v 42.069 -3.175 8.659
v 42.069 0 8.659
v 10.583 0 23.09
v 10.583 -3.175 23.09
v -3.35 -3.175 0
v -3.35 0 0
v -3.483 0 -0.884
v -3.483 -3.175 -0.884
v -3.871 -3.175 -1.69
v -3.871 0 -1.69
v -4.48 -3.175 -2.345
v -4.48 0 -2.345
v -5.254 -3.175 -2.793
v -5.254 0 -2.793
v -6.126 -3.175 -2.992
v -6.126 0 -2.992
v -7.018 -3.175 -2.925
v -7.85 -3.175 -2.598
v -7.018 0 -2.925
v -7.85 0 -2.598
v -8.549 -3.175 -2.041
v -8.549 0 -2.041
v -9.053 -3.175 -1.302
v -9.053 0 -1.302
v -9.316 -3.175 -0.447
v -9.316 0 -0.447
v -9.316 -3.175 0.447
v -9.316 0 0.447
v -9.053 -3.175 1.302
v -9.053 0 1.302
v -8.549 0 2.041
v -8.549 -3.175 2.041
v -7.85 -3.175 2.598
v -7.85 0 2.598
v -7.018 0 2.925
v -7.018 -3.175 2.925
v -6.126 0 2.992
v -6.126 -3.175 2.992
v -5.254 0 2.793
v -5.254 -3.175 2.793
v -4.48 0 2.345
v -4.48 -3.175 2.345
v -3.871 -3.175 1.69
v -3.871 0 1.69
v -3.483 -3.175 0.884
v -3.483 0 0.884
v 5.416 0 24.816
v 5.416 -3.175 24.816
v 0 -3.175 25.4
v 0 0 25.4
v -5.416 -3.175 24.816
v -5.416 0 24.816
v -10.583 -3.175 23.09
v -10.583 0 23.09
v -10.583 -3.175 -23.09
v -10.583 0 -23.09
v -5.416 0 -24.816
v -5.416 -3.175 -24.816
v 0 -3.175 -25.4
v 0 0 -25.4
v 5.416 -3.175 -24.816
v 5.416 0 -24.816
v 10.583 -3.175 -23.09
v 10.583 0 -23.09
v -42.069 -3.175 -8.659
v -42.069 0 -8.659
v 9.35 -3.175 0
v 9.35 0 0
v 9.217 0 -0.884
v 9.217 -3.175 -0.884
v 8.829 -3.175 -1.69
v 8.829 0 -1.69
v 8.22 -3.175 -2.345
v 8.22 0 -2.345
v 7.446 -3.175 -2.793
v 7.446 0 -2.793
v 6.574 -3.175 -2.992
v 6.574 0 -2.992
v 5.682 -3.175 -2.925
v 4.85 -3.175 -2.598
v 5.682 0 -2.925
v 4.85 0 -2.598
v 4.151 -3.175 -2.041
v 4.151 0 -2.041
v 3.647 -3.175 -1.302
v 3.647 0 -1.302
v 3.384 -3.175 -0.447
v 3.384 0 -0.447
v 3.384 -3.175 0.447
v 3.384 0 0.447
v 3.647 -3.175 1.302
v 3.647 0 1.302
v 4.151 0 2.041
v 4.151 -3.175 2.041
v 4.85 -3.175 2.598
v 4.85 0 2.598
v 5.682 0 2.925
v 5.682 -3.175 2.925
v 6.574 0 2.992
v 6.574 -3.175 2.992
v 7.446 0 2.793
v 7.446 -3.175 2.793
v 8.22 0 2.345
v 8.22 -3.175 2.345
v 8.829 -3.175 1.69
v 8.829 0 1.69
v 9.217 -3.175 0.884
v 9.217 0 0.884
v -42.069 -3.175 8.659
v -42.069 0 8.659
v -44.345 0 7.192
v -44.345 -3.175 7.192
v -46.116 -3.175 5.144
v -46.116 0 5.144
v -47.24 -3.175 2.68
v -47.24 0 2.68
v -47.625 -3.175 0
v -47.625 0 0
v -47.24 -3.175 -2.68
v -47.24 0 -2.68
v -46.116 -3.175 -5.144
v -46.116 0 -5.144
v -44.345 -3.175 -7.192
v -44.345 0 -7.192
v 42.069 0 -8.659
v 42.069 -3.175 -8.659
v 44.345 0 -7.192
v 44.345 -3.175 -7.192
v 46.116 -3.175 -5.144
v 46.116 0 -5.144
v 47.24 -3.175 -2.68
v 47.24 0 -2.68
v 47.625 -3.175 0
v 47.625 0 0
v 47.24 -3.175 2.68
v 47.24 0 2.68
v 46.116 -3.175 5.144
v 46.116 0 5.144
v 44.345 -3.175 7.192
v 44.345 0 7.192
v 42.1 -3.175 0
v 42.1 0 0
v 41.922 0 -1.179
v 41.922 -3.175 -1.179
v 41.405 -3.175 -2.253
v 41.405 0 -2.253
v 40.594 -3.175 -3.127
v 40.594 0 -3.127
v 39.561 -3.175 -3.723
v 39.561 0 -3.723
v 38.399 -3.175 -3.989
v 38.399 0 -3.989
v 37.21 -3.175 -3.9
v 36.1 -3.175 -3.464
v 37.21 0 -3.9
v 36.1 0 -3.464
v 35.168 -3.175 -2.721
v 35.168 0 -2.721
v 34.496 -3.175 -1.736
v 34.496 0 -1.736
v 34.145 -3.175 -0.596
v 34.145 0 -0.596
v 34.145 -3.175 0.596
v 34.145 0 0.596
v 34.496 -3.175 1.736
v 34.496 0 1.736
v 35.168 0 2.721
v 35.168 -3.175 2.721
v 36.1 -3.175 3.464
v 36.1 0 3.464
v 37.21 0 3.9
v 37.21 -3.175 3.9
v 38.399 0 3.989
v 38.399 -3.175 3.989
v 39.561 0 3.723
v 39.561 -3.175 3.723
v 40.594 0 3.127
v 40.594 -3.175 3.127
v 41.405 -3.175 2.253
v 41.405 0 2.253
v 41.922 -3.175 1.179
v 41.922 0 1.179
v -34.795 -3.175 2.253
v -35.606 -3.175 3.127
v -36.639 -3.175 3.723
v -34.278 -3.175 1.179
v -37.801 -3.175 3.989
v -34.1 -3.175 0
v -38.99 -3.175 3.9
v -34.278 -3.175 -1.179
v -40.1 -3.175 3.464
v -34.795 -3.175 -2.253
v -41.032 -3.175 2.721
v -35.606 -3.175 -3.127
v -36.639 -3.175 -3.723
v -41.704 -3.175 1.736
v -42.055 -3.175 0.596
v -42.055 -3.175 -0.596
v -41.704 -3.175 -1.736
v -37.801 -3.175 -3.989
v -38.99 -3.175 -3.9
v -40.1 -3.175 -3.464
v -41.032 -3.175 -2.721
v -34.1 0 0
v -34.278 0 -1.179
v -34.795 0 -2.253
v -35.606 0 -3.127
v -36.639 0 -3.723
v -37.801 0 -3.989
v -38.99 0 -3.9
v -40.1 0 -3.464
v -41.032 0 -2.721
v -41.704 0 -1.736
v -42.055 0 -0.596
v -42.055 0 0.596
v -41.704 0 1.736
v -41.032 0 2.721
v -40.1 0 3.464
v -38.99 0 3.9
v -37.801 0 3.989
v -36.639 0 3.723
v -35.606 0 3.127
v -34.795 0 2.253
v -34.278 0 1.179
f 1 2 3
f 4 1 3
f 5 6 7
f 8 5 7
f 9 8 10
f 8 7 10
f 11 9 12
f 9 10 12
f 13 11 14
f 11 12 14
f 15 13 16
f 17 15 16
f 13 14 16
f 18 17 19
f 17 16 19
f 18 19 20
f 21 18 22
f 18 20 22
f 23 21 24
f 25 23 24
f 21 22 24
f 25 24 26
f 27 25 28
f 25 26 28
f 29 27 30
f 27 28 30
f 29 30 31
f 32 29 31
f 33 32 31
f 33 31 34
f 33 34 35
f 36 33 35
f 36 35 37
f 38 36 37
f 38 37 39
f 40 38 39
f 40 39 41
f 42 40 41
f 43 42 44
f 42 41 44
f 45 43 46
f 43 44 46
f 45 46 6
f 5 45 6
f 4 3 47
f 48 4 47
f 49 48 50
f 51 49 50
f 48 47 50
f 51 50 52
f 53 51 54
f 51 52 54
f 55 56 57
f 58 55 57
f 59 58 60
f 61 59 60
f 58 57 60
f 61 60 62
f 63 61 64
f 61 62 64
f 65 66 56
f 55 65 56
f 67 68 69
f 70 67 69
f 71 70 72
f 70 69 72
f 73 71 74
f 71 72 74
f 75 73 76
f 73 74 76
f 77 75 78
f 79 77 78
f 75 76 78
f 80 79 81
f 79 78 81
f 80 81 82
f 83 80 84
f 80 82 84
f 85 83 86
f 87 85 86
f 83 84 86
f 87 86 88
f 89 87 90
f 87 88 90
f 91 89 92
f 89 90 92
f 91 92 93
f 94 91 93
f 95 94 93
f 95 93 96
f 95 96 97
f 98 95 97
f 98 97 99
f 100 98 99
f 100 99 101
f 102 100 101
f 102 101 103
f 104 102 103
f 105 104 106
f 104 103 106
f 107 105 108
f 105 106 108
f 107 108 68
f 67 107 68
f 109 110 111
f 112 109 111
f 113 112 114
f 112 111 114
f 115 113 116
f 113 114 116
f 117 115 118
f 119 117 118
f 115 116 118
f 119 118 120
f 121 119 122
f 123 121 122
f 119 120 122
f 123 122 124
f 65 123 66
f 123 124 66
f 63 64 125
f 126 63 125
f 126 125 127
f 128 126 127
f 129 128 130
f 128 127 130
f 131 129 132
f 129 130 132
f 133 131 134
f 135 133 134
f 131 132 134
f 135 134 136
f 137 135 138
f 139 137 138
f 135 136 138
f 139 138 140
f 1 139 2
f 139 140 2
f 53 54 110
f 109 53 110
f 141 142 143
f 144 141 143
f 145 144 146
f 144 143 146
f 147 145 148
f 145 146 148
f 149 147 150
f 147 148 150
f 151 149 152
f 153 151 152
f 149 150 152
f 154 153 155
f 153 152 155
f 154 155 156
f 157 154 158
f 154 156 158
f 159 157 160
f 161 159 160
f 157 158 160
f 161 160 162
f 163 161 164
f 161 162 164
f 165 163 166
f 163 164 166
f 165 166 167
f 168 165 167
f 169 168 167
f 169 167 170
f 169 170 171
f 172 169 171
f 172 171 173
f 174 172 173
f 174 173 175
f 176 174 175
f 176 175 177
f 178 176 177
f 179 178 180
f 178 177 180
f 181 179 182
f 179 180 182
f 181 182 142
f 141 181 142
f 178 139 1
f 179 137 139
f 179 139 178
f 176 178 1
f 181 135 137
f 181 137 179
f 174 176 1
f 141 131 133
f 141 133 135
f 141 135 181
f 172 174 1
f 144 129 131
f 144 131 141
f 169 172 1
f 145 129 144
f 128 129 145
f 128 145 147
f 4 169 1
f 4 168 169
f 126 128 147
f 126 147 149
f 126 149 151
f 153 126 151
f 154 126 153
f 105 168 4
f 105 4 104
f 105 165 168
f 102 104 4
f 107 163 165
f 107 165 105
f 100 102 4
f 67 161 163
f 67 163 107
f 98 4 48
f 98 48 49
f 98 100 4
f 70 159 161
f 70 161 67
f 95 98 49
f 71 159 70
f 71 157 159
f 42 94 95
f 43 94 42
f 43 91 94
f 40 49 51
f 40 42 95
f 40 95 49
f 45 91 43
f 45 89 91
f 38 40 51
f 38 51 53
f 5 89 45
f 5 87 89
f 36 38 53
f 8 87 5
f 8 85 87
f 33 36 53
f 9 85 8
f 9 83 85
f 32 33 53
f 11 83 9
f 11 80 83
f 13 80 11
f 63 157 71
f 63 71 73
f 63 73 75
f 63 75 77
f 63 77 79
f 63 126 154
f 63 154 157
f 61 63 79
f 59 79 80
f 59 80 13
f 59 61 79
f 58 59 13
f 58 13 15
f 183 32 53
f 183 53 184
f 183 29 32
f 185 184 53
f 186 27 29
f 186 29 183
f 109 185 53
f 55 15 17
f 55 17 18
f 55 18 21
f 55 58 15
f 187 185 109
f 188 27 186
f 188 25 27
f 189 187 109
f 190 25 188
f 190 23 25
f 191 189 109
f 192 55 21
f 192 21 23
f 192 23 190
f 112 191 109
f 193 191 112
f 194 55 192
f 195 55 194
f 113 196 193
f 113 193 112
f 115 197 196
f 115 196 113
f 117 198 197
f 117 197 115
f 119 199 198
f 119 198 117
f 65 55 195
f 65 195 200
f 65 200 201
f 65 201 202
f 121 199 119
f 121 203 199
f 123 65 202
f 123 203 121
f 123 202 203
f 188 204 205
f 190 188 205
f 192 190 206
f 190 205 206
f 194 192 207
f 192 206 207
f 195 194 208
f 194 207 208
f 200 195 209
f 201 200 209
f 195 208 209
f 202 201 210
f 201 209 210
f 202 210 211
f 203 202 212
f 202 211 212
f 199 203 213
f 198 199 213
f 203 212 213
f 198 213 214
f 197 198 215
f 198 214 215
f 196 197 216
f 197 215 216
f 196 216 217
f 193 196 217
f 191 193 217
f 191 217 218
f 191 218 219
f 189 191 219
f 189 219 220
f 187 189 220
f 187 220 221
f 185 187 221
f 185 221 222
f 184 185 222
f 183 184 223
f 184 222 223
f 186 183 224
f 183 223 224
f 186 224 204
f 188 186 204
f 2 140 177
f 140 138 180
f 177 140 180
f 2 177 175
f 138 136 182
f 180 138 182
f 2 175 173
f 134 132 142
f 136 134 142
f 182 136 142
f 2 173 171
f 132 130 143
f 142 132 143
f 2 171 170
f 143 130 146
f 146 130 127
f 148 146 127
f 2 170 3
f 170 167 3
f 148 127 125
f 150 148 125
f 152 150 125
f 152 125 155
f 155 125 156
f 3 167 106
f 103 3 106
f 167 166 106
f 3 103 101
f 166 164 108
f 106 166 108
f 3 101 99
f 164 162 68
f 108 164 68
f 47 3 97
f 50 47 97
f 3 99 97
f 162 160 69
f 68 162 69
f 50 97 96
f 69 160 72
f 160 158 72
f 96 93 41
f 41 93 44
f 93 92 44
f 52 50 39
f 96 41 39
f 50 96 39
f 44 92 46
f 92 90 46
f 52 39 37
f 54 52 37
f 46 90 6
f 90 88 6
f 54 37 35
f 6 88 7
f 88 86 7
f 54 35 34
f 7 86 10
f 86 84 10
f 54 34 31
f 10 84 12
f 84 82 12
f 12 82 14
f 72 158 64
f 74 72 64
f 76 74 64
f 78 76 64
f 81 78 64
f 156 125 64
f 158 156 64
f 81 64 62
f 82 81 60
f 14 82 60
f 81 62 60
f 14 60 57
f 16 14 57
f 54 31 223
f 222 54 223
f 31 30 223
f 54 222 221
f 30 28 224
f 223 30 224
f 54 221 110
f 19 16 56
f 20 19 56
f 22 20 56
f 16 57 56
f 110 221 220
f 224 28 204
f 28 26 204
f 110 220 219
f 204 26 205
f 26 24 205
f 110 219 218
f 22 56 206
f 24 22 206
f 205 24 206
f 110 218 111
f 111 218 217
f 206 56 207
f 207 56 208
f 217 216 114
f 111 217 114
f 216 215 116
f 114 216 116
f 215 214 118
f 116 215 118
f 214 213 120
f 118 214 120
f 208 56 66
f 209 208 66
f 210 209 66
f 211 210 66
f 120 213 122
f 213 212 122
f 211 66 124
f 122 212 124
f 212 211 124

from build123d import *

# Parameters (mm, degrees)
SKETCH1_R           = 4
SKETCH1_R_2         = 3
BOSS_EXTRUDE1_DEPTH = 3.175


with BuildPart() as part:
    # Sketch1 → Boss-Extrude1 (new body)
    with BuildSketch(Plane(origin=(0, 0, 0), x_dir=(1, 0, 0), z_dir=(0, 1, 0))):
        with BuildLine():
            Line((-42.06875, 8.658790241), (-10.583333333, 23.090107309))
            ThreePointArc((-10.583333333, 23.090107309), (0, 25.4), (10.583333333, 23.090107309))
            Line((10.583333333, 23.090107309), (42.06875, 8.658790241))
            ThreePointArc((42.06875, 8.658790241), (47.625, 0), (42.06875, -8.658790241))
            Line((42.06875, -8.658790241), (10.583333333, -23.090107309))
            ThreePointArc((10.583333333, -23.090107309), (0, -25.4), (-10.583333333, -23.090107309))
            Line((-10.583333333, -23.090107309), (-42.06875, -8.658790241))
            ThreePointArc((-42.06875, -8.658790241), (-47.625, 0), (-42.06875, 8.658790241))
        make_face()
        with Locations((-38.1, 0)):
            Circle(SKETCH1_R, mode=Mode.SUBTRACT)
        with Locations((38.1, 0)):
            Circle(SKETCH1_R, mode=Mode.SUBTRACT)
        with Locations((6.35, 0)):
            Circle(SKETCH1_R_2, mode=Mode.SUBTRACT)
        with Locations((-6.35, 0)):
            Circle(SKETCH1_R_2, mode=Mode.SUBTRACT)
    extrude(amount=-BOSS_EXTRUDE1_DEPTH)


solid = part.part
